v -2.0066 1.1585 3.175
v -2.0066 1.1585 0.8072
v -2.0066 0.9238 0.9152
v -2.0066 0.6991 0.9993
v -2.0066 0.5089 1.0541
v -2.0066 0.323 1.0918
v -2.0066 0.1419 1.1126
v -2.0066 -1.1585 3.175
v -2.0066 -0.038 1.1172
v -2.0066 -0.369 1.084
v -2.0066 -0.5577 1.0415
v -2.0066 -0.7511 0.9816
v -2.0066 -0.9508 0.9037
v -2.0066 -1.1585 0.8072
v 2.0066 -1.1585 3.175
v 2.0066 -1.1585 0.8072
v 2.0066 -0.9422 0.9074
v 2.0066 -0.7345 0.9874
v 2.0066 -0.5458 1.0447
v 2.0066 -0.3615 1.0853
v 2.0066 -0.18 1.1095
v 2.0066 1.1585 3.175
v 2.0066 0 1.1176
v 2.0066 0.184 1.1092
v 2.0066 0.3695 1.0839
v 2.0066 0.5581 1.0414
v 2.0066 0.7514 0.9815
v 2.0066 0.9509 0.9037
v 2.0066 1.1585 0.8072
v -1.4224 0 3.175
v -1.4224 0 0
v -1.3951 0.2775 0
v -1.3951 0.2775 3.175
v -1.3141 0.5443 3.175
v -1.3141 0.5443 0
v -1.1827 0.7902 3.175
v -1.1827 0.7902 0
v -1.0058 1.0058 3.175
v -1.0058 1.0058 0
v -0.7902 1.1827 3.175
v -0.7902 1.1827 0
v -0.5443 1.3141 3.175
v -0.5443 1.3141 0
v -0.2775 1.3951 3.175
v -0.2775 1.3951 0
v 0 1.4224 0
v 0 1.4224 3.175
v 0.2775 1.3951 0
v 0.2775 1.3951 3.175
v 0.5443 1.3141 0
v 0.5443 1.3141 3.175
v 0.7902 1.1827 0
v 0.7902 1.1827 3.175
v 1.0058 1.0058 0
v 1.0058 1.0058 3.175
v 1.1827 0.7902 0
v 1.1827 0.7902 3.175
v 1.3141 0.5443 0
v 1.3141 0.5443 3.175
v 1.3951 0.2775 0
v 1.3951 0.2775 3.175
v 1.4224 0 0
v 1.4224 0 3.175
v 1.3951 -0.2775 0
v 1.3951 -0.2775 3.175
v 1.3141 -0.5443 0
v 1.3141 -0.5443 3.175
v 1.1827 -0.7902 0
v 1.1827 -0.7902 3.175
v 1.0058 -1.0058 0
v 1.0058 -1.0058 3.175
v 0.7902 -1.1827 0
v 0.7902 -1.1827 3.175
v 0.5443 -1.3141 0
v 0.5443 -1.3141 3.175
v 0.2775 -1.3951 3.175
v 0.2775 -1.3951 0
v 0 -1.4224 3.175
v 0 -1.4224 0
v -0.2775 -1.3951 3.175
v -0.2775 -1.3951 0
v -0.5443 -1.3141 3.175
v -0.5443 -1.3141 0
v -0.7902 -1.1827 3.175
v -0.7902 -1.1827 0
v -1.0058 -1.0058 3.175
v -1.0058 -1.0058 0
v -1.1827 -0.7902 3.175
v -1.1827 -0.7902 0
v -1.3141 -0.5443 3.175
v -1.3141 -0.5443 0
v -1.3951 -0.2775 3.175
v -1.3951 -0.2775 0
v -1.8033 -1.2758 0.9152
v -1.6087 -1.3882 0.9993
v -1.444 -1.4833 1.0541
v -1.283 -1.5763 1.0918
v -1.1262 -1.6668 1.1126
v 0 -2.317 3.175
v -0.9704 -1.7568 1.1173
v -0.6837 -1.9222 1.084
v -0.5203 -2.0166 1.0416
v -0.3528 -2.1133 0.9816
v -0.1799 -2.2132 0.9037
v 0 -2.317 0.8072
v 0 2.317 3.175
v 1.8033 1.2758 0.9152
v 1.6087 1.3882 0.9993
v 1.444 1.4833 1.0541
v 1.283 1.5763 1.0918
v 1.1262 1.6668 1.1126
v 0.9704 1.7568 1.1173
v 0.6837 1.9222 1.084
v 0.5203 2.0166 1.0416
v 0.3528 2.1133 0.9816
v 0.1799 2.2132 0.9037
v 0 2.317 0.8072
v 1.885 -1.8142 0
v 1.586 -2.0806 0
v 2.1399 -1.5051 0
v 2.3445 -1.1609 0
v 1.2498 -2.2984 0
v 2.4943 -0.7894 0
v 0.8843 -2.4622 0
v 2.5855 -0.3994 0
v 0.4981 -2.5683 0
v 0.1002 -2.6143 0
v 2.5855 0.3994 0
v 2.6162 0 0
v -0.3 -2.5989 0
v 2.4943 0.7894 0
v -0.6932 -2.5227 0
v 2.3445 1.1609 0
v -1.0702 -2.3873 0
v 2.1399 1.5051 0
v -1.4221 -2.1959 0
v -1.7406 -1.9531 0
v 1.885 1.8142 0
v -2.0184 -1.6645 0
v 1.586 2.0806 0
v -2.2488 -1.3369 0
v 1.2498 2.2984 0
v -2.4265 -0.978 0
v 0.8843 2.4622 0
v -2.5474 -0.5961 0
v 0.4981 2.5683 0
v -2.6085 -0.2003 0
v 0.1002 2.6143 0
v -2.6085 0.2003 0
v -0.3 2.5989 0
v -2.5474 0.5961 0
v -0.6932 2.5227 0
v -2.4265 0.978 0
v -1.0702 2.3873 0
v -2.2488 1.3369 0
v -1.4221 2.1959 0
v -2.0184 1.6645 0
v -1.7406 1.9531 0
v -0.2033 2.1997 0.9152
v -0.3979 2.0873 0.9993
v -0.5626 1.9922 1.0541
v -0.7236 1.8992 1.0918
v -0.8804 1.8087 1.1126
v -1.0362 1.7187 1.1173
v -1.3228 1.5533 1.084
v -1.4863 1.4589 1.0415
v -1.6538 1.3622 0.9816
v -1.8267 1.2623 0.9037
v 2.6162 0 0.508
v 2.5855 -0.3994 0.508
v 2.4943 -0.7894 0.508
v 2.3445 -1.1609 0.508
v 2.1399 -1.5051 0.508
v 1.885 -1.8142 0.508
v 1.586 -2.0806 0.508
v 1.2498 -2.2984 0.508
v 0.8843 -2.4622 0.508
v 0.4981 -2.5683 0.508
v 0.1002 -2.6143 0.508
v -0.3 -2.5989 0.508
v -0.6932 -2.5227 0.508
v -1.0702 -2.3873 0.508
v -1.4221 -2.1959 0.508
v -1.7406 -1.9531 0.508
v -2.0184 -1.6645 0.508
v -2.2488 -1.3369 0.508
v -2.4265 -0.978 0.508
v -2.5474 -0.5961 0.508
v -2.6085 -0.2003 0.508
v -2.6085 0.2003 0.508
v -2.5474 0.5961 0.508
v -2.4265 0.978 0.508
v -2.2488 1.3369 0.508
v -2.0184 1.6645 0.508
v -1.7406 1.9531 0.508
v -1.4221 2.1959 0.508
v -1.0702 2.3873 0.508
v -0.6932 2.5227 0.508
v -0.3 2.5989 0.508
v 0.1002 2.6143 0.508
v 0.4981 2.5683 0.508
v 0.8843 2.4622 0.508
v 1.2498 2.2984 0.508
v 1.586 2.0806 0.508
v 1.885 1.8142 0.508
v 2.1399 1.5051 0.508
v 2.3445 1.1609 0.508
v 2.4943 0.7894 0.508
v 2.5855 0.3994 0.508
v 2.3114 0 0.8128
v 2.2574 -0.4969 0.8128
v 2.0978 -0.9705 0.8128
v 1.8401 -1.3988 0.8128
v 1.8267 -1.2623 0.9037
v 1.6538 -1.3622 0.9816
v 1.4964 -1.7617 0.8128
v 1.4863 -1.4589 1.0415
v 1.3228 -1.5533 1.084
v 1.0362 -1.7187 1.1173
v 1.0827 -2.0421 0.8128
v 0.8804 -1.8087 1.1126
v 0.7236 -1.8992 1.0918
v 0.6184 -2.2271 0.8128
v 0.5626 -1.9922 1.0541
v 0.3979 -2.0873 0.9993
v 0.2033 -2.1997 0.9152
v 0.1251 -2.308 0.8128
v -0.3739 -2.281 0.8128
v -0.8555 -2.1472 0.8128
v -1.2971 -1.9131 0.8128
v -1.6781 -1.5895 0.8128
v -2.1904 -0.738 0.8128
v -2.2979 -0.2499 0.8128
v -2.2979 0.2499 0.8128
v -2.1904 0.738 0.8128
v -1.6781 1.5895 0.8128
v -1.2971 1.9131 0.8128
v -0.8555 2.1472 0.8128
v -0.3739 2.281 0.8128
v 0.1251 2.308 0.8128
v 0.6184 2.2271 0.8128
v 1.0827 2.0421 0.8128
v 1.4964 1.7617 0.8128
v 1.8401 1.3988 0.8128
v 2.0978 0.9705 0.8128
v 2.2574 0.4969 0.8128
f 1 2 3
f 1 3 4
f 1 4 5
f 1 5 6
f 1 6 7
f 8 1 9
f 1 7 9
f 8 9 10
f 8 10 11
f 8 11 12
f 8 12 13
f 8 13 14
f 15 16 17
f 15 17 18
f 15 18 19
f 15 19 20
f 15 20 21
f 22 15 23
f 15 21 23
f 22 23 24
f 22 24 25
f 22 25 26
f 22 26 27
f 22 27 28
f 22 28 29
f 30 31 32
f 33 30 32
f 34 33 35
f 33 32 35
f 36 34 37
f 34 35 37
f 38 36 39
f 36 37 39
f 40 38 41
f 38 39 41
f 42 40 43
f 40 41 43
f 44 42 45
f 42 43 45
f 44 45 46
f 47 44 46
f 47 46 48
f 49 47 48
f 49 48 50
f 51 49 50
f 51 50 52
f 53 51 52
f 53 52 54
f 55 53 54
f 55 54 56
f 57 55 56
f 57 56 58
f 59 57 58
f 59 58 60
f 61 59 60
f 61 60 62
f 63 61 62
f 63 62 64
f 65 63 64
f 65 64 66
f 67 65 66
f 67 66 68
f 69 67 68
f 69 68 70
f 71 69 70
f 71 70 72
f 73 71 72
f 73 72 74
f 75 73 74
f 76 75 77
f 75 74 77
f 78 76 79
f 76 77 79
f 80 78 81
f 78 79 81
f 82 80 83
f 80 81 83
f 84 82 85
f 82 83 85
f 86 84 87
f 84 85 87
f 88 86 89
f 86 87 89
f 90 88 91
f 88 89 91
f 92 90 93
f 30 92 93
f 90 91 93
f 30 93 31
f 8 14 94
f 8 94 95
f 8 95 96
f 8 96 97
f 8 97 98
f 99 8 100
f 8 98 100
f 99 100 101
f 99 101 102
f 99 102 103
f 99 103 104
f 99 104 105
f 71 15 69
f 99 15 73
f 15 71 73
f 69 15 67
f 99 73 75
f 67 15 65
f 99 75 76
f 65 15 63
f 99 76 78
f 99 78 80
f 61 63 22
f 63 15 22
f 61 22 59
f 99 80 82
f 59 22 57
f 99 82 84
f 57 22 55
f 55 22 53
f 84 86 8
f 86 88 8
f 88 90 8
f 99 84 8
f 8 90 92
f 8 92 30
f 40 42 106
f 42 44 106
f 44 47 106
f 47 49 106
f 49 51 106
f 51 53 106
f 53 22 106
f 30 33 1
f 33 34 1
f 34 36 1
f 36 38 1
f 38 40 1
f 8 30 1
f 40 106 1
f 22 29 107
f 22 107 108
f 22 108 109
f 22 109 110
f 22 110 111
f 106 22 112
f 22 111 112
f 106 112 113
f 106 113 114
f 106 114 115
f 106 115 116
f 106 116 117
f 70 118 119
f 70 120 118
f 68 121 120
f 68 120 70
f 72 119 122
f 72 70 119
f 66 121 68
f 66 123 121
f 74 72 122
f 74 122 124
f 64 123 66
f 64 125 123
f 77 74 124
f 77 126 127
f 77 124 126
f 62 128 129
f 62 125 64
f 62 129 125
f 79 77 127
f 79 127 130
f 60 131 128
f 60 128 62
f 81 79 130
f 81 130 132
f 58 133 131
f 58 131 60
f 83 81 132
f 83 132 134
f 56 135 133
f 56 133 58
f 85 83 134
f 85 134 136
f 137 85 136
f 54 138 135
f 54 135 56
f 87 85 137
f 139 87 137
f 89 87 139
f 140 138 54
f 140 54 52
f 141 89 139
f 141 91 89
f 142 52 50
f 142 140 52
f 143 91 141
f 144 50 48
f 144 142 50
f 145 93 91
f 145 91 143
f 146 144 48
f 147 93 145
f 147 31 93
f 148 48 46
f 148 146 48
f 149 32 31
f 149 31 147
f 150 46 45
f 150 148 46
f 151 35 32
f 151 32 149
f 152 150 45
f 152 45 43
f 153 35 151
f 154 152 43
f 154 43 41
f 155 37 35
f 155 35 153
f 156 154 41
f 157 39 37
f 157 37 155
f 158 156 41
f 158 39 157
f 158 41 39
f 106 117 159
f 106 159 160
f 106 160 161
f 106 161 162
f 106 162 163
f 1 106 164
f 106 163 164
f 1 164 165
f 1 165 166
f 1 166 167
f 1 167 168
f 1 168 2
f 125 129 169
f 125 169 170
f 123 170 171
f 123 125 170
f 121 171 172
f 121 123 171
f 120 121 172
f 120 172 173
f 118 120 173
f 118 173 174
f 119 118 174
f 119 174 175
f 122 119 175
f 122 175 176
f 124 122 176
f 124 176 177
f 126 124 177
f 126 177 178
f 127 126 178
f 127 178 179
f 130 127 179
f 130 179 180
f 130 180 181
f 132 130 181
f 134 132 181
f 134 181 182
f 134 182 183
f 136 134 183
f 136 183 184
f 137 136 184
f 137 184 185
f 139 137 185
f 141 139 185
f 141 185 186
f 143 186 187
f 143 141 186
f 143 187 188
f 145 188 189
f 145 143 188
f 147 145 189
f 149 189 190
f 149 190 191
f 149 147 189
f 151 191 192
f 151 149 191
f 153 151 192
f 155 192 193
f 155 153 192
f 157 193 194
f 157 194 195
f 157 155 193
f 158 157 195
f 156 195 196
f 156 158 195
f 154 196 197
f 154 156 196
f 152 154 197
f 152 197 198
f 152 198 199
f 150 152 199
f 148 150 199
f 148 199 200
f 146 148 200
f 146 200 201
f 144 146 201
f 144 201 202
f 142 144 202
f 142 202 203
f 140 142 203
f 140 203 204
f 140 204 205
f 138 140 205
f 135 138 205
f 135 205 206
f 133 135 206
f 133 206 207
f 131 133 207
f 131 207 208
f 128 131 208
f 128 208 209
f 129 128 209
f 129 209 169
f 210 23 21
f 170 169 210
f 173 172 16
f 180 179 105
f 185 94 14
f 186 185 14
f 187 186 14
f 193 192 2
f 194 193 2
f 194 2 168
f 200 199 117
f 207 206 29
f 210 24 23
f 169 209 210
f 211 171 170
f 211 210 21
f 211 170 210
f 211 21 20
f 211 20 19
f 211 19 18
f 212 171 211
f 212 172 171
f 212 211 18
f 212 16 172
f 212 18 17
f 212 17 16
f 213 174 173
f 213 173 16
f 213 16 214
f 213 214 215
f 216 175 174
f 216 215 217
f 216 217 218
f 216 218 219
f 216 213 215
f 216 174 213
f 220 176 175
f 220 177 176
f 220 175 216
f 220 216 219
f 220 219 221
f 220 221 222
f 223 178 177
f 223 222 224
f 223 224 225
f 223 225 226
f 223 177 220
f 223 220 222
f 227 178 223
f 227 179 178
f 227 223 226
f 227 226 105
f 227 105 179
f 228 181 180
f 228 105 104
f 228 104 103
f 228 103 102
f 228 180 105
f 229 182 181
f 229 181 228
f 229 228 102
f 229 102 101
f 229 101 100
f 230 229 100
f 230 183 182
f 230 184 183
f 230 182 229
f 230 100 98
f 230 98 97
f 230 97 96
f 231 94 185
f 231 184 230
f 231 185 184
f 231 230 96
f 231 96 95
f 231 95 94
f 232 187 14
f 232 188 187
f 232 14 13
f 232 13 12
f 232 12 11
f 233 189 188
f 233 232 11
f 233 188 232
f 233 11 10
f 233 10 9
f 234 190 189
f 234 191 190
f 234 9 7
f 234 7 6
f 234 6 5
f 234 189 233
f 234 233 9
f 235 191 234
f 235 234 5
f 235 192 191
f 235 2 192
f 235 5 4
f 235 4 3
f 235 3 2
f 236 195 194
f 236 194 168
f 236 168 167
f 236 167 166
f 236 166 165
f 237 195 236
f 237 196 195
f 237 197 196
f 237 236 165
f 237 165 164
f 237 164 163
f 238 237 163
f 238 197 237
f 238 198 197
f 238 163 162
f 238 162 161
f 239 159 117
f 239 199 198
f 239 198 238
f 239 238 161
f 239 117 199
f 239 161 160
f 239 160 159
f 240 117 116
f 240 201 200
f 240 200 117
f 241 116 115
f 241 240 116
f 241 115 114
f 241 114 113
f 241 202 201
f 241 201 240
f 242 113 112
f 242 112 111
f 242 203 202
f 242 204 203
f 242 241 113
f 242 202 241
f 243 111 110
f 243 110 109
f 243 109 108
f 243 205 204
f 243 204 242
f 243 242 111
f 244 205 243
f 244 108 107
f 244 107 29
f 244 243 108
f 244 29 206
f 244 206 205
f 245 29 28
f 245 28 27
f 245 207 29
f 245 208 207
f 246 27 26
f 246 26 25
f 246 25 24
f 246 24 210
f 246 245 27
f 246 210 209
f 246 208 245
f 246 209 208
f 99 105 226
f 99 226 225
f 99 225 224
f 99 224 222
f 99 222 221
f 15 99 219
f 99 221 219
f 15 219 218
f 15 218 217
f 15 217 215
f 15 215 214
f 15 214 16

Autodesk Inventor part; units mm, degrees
ref_plane "YZ Plane" through (0, 0, 0) normal (1, 0, 0) x (0, 1, 0)
ref_plane "XZ Plane" through (0, 0, 0) normal (0, 1, 0) x (-1, 0, 0)
ref_plane "XY Plane" through (0, 0, 0) normal (0, 0, 1) x (1, 0, 0)
sketch "Sketch1" plane through (0, 0, 0) normal (0, 0, 1) x (1, 0, 0)
  circle A0 centre (0, 0) radius 2.6162
  dimension "d0" = 5.2324
extrude "Extrusion1" add sketch "Sketch1" along normal blind 0.508
sketch "Sketch2" plane through (0, 0, 0.508) normal (0, 0, 1) x (1, 0, 0)
  circle A0 centre (0, 0) radius 2.6162 projected
  circle A1 centre (0, 0) radius 2.6162
extrude "Extrusion2" add sketch "Sketch2" along normal blind 2.54 draft -45
sketch "Sketch3" plane through (0, 0, 0) normal (0, 0, -1) x (-1, 0, 0)
  circle A0 centre (0, 0) radius 2.6162 projected
  line L0 (-2.0066, 1.1585) -> (0, 2.317)
  line L1 (0, 2.317) -> (2.0066, 1.1585)
  line L2 (2.0066, 1.1585) -> (2.0066, -1.1585)
  line L3 (2.0066, -1.1585) -> (0, -2.317)
  line L4 (0, -2.317) -> (-2.0066, -1.1585)
  line L5 (-2.0066, -1.1585) -> (-2.0066, 1.1585)
  dimension "d5" = 4.0132
extrude "Extrusion3" add sketch "Sketch3" against normal blind 3.175 contours L0 L1 L2 L3 L4 L5
sketch "Sketch4" plane through (0, 0, 0) normal (0, 0, -1) x (-1, 0, 0)
  circle A0 centre (0, 0) radius 2.6162 projected
  circle A1 centre (0, 0) radius 1.4224
  dimension "d8" = 2.8448
extrude "Extrusion4" cut sketch "Sketch4" against normal through all contours A1
properties part number "MS21042-04"
